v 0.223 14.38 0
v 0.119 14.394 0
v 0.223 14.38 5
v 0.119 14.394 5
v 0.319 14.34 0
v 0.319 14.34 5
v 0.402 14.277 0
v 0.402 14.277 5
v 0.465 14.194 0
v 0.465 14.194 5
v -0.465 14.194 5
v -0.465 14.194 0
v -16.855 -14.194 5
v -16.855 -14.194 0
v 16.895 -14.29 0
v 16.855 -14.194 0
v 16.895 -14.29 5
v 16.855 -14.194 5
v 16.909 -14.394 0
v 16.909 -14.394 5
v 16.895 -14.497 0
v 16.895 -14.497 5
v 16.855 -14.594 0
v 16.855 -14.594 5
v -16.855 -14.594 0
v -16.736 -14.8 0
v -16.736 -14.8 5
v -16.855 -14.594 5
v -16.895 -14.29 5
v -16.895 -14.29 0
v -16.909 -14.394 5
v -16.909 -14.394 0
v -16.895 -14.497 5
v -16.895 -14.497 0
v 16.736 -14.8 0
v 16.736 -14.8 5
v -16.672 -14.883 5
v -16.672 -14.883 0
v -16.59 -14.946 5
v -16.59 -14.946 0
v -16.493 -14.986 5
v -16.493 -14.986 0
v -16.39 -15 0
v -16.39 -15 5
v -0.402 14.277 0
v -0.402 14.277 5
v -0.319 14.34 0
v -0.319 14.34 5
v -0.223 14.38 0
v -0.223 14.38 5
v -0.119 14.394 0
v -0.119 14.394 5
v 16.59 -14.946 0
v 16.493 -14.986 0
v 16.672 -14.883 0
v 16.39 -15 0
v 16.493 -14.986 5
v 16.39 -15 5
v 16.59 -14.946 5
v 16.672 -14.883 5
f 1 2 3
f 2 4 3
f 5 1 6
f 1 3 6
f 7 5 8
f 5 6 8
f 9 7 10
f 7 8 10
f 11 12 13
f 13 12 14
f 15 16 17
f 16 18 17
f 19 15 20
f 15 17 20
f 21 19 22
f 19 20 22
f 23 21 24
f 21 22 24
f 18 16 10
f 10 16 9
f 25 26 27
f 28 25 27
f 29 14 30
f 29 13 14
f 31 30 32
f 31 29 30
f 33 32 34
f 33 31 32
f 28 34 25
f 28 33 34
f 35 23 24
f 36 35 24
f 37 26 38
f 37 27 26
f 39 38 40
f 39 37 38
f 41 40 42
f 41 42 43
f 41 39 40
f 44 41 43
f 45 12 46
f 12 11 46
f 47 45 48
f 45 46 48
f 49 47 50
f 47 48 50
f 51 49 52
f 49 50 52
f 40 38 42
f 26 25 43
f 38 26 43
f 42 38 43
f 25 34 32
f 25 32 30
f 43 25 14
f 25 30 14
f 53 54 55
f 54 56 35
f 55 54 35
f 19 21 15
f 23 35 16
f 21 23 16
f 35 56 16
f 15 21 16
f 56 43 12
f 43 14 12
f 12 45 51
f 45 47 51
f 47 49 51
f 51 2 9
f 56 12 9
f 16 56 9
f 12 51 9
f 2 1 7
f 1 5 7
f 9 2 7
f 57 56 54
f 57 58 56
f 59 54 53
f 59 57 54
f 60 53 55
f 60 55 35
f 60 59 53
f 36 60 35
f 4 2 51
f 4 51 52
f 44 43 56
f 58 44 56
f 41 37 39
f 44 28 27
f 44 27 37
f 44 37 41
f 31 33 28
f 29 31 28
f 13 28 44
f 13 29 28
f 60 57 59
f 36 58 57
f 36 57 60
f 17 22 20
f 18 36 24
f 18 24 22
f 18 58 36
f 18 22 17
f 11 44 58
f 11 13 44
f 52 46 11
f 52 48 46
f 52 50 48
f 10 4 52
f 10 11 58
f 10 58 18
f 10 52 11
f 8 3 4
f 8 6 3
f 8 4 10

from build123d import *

# Parameters (mm, degrees)
F1_DEPTH = 5
F2_SIZE  = 0.7
F3_R     = 0.4


with BuildPart() as f1:
    # F0 (on Top) → F1 (new body)
    with BuildSketch(Plane.XY):
        Polygon((0, 15), (-17.3205080757, -15), (17.3205080757, -15), align=None)
    extrude(amount=F1_DEPTH)

    # F2
    f2_edges = [f1.edges().sort_by_distance(p)[0] for p in [
        (-17.320508, -15, 2.5),
        (17.320508, -15, 2.5),
        (0, 15, 2.5),
    ]]
    chamfer(f2_edges, length=F2_SIZE)

    # F3
    f3_edges = [f1.edges().sort_by_distance(p)[0] for p in [
        (-0.35, 14.393782, 2.5),
        (0.35, 14.393782, 2.5),
        (16.970508, -14.393782, 2.5),
        (16.620508, -15, 2.5),
        (-16.620508, -15, 2.5),
        (-16.970508, -14.393782, 2.5),
    ]]
    fillet(f3_edges, radius=F3_R)


solid = f1.part
